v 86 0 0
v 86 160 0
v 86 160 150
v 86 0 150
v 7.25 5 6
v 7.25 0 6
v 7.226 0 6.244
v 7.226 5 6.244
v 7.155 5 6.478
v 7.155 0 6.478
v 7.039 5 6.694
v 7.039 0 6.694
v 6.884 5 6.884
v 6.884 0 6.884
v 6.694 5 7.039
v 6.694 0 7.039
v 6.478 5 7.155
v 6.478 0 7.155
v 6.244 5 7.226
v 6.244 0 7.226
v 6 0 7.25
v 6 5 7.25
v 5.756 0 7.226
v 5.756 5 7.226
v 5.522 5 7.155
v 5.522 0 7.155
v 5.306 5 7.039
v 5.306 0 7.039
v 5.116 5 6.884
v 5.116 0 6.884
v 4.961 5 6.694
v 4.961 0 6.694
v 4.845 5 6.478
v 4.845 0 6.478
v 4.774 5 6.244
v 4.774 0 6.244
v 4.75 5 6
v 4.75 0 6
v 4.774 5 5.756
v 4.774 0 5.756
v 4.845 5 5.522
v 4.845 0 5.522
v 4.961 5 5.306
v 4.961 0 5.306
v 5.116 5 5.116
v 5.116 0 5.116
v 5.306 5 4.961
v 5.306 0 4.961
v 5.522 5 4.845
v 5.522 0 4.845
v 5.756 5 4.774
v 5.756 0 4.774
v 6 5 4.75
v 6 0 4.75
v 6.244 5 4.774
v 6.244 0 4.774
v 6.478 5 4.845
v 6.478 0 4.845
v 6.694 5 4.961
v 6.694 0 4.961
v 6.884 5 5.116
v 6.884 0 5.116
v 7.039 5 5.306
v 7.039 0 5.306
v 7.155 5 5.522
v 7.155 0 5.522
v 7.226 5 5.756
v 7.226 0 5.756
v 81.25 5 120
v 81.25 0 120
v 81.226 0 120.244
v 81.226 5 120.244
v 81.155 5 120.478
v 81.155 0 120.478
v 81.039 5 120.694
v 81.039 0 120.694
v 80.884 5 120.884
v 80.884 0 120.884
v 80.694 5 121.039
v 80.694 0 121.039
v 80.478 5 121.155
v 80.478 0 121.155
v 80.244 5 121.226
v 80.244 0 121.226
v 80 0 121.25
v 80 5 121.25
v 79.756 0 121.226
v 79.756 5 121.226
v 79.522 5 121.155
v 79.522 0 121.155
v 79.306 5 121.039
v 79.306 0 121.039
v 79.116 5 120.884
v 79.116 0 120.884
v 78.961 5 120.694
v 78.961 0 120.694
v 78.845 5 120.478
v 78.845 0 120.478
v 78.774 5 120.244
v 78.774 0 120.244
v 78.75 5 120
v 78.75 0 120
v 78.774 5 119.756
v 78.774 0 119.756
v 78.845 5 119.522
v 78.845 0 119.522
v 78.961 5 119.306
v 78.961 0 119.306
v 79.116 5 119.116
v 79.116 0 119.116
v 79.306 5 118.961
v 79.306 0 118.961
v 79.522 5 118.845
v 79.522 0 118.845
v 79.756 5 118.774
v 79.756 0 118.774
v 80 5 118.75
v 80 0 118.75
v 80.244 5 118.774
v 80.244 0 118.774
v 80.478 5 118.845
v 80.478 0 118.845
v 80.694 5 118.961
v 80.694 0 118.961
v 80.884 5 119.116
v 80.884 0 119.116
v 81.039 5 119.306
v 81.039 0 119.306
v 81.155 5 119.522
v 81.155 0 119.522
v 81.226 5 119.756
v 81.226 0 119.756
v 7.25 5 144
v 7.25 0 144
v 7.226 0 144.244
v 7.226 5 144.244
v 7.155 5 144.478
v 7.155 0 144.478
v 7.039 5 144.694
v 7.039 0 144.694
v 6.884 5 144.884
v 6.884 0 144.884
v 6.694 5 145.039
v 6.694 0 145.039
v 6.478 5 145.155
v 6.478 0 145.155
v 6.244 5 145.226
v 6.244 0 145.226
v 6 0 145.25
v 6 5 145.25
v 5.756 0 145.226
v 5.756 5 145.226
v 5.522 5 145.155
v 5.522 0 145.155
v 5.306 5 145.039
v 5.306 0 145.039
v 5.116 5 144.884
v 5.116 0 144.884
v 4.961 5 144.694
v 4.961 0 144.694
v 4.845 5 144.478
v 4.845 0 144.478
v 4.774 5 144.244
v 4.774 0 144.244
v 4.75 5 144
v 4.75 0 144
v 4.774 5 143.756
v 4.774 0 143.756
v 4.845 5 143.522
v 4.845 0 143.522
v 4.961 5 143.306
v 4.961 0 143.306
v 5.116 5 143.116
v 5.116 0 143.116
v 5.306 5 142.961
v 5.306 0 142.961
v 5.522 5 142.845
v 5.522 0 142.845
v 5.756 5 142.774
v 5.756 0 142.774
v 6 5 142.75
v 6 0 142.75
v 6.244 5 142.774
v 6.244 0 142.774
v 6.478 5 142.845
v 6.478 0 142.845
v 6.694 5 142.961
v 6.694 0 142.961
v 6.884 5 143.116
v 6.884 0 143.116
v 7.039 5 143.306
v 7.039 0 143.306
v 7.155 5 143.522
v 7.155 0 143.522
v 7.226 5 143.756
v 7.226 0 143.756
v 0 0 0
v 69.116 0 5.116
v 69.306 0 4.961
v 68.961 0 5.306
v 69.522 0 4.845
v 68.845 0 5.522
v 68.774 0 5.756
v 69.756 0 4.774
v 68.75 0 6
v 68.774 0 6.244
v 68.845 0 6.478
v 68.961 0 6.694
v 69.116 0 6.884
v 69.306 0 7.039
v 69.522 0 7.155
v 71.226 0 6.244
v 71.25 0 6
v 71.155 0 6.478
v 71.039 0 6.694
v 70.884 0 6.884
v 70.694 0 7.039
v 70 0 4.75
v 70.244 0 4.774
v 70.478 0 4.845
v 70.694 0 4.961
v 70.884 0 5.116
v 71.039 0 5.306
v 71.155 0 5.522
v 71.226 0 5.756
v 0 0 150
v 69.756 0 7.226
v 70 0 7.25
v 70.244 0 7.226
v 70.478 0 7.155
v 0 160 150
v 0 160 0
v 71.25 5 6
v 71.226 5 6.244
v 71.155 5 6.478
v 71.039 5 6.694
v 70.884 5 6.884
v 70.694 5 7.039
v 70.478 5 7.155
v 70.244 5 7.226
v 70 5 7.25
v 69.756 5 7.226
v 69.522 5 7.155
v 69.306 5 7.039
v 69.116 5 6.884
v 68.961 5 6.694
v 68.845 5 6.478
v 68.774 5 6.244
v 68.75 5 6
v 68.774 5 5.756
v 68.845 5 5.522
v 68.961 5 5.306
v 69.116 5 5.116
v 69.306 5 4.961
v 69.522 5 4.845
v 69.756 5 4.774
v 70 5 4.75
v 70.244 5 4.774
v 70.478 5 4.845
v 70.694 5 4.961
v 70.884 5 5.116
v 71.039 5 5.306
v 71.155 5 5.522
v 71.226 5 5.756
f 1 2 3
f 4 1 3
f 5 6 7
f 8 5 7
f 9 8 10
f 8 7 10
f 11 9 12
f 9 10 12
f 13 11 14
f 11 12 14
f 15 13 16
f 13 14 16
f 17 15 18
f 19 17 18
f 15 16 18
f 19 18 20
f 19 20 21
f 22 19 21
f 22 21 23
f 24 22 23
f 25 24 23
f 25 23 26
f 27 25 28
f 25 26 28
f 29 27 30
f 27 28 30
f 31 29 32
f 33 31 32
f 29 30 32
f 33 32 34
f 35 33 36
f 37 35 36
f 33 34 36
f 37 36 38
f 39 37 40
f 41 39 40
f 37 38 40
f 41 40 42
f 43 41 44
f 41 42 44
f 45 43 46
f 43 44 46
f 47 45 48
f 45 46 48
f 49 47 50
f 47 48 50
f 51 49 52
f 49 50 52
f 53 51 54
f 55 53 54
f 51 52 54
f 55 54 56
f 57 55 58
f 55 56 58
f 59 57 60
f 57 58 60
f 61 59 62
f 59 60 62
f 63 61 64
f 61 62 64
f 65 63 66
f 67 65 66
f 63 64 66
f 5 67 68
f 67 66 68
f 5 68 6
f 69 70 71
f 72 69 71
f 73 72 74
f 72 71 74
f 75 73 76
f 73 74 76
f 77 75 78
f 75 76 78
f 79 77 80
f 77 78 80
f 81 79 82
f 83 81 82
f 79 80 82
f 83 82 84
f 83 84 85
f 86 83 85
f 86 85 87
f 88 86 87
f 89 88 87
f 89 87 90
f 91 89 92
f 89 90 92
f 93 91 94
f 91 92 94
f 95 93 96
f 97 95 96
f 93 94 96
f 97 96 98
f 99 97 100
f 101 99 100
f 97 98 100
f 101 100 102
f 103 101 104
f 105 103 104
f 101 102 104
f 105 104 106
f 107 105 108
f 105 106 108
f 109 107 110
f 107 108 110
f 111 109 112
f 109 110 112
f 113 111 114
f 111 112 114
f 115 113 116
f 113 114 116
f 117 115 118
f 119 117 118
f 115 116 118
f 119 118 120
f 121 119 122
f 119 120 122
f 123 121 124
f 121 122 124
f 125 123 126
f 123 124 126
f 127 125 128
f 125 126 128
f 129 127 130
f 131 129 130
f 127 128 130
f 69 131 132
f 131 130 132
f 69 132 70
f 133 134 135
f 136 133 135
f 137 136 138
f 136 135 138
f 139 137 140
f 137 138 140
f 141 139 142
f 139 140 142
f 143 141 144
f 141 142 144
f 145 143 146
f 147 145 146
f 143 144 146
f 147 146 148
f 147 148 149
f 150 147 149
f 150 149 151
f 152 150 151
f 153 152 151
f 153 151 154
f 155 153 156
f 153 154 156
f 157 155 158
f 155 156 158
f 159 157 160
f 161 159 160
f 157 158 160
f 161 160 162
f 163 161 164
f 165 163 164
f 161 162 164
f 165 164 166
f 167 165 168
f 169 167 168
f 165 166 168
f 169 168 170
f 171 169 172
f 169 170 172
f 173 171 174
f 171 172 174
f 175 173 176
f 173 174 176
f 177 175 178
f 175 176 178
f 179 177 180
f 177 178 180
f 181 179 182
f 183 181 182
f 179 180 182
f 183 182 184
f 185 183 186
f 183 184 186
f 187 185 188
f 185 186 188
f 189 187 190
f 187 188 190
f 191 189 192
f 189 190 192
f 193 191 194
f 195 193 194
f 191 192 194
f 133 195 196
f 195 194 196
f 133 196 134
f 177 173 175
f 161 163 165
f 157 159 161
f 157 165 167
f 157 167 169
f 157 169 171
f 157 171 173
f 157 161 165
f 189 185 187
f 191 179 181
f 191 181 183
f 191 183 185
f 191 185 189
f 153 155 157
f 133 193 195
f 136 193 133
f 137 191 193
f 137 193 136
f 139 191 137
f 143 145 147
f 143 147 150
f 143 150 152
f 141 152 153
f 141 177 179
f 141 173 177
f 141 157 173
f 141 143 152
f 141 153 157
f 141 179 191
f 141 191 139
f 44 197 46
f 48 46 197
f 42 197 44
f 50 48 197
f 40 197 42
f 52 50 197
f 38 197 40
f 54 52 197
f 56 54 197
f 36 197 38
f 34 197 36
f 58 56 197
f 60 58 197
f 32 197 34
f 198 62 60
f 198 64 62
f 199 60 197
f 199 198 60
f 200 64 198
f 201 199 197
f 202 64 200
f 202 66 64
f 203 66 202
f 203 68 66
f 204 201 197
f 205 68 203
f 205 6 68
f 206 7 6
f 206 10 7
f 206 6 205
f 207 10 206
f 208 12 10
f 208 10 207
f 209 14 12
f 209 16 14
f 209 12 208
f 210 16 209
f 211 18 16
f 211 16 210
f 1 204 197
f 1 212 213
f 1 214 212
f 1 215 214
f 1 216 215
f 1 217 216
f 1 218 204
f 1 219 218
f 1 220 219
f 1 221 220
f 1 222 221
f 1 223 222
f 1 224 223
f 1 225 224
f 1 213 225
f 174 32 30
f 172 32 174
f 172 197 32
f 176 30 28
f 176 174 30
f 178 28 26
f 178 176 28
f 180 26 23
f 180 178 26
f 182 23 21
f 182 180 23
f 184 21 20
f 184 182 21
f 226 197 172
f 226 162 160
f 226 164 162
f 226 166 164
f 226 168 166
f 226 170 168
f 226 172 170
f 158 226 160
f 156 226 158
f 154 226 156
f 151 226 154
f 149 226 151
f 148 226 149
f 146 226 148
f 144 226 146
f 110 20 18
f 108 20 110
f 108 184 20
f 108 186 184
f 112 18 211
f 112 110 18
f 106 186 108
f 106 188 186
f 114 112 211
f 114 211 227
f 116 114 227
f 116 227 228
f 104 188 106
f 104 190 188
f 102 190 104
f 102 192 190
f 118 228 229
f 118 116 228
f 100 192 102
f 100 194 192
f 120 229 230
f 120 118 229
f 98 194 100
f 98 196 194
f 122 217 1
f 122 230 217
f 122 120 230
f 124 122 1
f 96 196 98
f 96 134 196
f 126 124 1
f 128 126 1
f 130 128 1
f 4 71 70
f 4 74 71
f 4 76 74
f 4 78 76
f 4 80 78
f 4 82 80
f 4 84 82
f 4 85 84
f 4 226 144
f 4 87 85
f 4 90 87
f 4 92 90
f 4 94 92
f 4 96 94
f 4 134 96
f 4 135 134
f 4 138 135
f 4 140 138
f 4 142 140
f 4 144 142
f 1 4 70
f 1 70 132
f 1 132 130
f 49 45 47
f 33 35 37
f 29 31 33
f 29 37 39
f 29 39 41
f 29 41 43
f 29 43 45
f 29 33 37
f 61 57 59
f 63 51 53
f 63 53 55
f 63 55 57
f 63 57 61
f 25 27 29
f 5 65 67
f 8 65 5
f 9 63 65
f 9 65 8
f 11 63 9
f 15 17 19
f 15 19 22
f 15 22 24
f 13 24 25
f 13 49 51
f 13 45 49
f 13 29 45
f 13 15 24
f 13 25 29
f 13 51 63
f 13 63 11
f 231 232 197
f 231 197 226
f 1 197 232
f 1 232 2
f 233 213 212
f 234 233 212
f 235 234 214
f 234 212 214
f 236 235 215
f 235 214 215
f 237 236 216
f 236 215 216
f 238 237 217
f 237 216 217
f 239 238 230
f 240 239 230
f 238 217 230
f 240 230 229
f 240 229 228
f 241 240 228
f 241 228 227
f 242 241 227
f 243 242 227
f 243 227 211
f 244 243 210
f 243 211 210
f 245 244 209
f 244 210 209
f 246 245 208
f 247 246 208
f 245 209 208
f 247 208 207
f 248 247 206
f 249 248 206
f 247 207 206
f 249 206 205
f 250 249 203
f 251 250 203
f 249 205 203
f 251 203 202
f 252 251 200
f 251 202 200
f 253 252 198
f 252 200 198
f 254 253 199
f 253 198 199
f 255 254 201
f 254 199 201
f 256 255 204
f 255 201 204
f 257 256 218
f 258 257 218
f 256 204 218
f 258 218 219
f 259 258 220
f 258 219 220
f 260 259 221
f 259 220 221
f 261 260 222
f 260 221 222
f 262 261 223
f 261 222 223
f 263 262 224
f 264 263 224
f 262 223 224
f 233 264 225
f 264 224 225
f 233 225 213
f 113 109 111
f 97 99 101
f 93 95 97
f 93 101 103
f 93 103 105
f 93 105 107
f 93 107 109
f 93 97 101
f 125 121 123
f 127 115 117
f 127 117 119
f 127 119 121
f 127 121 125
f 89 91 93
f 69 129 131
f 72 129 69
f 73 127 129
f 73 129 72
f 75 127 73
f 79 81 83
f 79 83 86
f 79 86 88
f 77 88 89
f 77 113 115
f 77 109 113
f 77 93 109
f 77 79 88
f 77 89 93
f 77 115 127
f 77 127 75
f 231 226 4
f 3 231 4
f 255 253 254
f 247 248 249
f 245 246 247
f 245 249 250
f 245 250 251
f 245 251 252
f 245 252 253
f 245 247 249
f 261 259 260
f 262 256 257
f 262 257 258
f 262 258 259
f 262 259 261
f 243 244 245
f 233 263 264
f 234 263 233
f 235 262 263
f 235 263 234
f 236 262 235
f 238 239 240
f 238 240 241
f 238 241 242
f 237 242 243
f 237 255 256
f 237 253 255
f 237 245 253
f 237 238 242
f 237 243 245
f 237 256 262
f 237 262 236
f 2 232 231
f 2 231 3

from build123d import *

# Parameters (mm, degrees)
F0_W     = 86
F0_H     = 150
F1_DEPTH = 160
F2_R     = 1.25
F3_DEPTH = 5


with BuildPart() as f1:
    # F0 (on Front) → F1 (new body)
    with BuildSketch(Plane.XZ):
        with Locations((43, 75)):
            Rectangle(F0_W, F0_H)
    extrude(amount=-F1_DEPTH)

    # F2 (on face) → F3 (cut)
    with BuildSketch(Plane.XZ):
        with Locations((6, 6)):
            Circle(F2_R)
        with Locations((70, 6)):
            Circle(F2_R)
        with Locations((80, 120)):
            Circle(F2_R)
        with Locations((6, 144)):
            Circle(F2_R)
    extrude(amount=-F3_DEPTH, mode=Mode.SUBTRACT)


solid = f1.part
